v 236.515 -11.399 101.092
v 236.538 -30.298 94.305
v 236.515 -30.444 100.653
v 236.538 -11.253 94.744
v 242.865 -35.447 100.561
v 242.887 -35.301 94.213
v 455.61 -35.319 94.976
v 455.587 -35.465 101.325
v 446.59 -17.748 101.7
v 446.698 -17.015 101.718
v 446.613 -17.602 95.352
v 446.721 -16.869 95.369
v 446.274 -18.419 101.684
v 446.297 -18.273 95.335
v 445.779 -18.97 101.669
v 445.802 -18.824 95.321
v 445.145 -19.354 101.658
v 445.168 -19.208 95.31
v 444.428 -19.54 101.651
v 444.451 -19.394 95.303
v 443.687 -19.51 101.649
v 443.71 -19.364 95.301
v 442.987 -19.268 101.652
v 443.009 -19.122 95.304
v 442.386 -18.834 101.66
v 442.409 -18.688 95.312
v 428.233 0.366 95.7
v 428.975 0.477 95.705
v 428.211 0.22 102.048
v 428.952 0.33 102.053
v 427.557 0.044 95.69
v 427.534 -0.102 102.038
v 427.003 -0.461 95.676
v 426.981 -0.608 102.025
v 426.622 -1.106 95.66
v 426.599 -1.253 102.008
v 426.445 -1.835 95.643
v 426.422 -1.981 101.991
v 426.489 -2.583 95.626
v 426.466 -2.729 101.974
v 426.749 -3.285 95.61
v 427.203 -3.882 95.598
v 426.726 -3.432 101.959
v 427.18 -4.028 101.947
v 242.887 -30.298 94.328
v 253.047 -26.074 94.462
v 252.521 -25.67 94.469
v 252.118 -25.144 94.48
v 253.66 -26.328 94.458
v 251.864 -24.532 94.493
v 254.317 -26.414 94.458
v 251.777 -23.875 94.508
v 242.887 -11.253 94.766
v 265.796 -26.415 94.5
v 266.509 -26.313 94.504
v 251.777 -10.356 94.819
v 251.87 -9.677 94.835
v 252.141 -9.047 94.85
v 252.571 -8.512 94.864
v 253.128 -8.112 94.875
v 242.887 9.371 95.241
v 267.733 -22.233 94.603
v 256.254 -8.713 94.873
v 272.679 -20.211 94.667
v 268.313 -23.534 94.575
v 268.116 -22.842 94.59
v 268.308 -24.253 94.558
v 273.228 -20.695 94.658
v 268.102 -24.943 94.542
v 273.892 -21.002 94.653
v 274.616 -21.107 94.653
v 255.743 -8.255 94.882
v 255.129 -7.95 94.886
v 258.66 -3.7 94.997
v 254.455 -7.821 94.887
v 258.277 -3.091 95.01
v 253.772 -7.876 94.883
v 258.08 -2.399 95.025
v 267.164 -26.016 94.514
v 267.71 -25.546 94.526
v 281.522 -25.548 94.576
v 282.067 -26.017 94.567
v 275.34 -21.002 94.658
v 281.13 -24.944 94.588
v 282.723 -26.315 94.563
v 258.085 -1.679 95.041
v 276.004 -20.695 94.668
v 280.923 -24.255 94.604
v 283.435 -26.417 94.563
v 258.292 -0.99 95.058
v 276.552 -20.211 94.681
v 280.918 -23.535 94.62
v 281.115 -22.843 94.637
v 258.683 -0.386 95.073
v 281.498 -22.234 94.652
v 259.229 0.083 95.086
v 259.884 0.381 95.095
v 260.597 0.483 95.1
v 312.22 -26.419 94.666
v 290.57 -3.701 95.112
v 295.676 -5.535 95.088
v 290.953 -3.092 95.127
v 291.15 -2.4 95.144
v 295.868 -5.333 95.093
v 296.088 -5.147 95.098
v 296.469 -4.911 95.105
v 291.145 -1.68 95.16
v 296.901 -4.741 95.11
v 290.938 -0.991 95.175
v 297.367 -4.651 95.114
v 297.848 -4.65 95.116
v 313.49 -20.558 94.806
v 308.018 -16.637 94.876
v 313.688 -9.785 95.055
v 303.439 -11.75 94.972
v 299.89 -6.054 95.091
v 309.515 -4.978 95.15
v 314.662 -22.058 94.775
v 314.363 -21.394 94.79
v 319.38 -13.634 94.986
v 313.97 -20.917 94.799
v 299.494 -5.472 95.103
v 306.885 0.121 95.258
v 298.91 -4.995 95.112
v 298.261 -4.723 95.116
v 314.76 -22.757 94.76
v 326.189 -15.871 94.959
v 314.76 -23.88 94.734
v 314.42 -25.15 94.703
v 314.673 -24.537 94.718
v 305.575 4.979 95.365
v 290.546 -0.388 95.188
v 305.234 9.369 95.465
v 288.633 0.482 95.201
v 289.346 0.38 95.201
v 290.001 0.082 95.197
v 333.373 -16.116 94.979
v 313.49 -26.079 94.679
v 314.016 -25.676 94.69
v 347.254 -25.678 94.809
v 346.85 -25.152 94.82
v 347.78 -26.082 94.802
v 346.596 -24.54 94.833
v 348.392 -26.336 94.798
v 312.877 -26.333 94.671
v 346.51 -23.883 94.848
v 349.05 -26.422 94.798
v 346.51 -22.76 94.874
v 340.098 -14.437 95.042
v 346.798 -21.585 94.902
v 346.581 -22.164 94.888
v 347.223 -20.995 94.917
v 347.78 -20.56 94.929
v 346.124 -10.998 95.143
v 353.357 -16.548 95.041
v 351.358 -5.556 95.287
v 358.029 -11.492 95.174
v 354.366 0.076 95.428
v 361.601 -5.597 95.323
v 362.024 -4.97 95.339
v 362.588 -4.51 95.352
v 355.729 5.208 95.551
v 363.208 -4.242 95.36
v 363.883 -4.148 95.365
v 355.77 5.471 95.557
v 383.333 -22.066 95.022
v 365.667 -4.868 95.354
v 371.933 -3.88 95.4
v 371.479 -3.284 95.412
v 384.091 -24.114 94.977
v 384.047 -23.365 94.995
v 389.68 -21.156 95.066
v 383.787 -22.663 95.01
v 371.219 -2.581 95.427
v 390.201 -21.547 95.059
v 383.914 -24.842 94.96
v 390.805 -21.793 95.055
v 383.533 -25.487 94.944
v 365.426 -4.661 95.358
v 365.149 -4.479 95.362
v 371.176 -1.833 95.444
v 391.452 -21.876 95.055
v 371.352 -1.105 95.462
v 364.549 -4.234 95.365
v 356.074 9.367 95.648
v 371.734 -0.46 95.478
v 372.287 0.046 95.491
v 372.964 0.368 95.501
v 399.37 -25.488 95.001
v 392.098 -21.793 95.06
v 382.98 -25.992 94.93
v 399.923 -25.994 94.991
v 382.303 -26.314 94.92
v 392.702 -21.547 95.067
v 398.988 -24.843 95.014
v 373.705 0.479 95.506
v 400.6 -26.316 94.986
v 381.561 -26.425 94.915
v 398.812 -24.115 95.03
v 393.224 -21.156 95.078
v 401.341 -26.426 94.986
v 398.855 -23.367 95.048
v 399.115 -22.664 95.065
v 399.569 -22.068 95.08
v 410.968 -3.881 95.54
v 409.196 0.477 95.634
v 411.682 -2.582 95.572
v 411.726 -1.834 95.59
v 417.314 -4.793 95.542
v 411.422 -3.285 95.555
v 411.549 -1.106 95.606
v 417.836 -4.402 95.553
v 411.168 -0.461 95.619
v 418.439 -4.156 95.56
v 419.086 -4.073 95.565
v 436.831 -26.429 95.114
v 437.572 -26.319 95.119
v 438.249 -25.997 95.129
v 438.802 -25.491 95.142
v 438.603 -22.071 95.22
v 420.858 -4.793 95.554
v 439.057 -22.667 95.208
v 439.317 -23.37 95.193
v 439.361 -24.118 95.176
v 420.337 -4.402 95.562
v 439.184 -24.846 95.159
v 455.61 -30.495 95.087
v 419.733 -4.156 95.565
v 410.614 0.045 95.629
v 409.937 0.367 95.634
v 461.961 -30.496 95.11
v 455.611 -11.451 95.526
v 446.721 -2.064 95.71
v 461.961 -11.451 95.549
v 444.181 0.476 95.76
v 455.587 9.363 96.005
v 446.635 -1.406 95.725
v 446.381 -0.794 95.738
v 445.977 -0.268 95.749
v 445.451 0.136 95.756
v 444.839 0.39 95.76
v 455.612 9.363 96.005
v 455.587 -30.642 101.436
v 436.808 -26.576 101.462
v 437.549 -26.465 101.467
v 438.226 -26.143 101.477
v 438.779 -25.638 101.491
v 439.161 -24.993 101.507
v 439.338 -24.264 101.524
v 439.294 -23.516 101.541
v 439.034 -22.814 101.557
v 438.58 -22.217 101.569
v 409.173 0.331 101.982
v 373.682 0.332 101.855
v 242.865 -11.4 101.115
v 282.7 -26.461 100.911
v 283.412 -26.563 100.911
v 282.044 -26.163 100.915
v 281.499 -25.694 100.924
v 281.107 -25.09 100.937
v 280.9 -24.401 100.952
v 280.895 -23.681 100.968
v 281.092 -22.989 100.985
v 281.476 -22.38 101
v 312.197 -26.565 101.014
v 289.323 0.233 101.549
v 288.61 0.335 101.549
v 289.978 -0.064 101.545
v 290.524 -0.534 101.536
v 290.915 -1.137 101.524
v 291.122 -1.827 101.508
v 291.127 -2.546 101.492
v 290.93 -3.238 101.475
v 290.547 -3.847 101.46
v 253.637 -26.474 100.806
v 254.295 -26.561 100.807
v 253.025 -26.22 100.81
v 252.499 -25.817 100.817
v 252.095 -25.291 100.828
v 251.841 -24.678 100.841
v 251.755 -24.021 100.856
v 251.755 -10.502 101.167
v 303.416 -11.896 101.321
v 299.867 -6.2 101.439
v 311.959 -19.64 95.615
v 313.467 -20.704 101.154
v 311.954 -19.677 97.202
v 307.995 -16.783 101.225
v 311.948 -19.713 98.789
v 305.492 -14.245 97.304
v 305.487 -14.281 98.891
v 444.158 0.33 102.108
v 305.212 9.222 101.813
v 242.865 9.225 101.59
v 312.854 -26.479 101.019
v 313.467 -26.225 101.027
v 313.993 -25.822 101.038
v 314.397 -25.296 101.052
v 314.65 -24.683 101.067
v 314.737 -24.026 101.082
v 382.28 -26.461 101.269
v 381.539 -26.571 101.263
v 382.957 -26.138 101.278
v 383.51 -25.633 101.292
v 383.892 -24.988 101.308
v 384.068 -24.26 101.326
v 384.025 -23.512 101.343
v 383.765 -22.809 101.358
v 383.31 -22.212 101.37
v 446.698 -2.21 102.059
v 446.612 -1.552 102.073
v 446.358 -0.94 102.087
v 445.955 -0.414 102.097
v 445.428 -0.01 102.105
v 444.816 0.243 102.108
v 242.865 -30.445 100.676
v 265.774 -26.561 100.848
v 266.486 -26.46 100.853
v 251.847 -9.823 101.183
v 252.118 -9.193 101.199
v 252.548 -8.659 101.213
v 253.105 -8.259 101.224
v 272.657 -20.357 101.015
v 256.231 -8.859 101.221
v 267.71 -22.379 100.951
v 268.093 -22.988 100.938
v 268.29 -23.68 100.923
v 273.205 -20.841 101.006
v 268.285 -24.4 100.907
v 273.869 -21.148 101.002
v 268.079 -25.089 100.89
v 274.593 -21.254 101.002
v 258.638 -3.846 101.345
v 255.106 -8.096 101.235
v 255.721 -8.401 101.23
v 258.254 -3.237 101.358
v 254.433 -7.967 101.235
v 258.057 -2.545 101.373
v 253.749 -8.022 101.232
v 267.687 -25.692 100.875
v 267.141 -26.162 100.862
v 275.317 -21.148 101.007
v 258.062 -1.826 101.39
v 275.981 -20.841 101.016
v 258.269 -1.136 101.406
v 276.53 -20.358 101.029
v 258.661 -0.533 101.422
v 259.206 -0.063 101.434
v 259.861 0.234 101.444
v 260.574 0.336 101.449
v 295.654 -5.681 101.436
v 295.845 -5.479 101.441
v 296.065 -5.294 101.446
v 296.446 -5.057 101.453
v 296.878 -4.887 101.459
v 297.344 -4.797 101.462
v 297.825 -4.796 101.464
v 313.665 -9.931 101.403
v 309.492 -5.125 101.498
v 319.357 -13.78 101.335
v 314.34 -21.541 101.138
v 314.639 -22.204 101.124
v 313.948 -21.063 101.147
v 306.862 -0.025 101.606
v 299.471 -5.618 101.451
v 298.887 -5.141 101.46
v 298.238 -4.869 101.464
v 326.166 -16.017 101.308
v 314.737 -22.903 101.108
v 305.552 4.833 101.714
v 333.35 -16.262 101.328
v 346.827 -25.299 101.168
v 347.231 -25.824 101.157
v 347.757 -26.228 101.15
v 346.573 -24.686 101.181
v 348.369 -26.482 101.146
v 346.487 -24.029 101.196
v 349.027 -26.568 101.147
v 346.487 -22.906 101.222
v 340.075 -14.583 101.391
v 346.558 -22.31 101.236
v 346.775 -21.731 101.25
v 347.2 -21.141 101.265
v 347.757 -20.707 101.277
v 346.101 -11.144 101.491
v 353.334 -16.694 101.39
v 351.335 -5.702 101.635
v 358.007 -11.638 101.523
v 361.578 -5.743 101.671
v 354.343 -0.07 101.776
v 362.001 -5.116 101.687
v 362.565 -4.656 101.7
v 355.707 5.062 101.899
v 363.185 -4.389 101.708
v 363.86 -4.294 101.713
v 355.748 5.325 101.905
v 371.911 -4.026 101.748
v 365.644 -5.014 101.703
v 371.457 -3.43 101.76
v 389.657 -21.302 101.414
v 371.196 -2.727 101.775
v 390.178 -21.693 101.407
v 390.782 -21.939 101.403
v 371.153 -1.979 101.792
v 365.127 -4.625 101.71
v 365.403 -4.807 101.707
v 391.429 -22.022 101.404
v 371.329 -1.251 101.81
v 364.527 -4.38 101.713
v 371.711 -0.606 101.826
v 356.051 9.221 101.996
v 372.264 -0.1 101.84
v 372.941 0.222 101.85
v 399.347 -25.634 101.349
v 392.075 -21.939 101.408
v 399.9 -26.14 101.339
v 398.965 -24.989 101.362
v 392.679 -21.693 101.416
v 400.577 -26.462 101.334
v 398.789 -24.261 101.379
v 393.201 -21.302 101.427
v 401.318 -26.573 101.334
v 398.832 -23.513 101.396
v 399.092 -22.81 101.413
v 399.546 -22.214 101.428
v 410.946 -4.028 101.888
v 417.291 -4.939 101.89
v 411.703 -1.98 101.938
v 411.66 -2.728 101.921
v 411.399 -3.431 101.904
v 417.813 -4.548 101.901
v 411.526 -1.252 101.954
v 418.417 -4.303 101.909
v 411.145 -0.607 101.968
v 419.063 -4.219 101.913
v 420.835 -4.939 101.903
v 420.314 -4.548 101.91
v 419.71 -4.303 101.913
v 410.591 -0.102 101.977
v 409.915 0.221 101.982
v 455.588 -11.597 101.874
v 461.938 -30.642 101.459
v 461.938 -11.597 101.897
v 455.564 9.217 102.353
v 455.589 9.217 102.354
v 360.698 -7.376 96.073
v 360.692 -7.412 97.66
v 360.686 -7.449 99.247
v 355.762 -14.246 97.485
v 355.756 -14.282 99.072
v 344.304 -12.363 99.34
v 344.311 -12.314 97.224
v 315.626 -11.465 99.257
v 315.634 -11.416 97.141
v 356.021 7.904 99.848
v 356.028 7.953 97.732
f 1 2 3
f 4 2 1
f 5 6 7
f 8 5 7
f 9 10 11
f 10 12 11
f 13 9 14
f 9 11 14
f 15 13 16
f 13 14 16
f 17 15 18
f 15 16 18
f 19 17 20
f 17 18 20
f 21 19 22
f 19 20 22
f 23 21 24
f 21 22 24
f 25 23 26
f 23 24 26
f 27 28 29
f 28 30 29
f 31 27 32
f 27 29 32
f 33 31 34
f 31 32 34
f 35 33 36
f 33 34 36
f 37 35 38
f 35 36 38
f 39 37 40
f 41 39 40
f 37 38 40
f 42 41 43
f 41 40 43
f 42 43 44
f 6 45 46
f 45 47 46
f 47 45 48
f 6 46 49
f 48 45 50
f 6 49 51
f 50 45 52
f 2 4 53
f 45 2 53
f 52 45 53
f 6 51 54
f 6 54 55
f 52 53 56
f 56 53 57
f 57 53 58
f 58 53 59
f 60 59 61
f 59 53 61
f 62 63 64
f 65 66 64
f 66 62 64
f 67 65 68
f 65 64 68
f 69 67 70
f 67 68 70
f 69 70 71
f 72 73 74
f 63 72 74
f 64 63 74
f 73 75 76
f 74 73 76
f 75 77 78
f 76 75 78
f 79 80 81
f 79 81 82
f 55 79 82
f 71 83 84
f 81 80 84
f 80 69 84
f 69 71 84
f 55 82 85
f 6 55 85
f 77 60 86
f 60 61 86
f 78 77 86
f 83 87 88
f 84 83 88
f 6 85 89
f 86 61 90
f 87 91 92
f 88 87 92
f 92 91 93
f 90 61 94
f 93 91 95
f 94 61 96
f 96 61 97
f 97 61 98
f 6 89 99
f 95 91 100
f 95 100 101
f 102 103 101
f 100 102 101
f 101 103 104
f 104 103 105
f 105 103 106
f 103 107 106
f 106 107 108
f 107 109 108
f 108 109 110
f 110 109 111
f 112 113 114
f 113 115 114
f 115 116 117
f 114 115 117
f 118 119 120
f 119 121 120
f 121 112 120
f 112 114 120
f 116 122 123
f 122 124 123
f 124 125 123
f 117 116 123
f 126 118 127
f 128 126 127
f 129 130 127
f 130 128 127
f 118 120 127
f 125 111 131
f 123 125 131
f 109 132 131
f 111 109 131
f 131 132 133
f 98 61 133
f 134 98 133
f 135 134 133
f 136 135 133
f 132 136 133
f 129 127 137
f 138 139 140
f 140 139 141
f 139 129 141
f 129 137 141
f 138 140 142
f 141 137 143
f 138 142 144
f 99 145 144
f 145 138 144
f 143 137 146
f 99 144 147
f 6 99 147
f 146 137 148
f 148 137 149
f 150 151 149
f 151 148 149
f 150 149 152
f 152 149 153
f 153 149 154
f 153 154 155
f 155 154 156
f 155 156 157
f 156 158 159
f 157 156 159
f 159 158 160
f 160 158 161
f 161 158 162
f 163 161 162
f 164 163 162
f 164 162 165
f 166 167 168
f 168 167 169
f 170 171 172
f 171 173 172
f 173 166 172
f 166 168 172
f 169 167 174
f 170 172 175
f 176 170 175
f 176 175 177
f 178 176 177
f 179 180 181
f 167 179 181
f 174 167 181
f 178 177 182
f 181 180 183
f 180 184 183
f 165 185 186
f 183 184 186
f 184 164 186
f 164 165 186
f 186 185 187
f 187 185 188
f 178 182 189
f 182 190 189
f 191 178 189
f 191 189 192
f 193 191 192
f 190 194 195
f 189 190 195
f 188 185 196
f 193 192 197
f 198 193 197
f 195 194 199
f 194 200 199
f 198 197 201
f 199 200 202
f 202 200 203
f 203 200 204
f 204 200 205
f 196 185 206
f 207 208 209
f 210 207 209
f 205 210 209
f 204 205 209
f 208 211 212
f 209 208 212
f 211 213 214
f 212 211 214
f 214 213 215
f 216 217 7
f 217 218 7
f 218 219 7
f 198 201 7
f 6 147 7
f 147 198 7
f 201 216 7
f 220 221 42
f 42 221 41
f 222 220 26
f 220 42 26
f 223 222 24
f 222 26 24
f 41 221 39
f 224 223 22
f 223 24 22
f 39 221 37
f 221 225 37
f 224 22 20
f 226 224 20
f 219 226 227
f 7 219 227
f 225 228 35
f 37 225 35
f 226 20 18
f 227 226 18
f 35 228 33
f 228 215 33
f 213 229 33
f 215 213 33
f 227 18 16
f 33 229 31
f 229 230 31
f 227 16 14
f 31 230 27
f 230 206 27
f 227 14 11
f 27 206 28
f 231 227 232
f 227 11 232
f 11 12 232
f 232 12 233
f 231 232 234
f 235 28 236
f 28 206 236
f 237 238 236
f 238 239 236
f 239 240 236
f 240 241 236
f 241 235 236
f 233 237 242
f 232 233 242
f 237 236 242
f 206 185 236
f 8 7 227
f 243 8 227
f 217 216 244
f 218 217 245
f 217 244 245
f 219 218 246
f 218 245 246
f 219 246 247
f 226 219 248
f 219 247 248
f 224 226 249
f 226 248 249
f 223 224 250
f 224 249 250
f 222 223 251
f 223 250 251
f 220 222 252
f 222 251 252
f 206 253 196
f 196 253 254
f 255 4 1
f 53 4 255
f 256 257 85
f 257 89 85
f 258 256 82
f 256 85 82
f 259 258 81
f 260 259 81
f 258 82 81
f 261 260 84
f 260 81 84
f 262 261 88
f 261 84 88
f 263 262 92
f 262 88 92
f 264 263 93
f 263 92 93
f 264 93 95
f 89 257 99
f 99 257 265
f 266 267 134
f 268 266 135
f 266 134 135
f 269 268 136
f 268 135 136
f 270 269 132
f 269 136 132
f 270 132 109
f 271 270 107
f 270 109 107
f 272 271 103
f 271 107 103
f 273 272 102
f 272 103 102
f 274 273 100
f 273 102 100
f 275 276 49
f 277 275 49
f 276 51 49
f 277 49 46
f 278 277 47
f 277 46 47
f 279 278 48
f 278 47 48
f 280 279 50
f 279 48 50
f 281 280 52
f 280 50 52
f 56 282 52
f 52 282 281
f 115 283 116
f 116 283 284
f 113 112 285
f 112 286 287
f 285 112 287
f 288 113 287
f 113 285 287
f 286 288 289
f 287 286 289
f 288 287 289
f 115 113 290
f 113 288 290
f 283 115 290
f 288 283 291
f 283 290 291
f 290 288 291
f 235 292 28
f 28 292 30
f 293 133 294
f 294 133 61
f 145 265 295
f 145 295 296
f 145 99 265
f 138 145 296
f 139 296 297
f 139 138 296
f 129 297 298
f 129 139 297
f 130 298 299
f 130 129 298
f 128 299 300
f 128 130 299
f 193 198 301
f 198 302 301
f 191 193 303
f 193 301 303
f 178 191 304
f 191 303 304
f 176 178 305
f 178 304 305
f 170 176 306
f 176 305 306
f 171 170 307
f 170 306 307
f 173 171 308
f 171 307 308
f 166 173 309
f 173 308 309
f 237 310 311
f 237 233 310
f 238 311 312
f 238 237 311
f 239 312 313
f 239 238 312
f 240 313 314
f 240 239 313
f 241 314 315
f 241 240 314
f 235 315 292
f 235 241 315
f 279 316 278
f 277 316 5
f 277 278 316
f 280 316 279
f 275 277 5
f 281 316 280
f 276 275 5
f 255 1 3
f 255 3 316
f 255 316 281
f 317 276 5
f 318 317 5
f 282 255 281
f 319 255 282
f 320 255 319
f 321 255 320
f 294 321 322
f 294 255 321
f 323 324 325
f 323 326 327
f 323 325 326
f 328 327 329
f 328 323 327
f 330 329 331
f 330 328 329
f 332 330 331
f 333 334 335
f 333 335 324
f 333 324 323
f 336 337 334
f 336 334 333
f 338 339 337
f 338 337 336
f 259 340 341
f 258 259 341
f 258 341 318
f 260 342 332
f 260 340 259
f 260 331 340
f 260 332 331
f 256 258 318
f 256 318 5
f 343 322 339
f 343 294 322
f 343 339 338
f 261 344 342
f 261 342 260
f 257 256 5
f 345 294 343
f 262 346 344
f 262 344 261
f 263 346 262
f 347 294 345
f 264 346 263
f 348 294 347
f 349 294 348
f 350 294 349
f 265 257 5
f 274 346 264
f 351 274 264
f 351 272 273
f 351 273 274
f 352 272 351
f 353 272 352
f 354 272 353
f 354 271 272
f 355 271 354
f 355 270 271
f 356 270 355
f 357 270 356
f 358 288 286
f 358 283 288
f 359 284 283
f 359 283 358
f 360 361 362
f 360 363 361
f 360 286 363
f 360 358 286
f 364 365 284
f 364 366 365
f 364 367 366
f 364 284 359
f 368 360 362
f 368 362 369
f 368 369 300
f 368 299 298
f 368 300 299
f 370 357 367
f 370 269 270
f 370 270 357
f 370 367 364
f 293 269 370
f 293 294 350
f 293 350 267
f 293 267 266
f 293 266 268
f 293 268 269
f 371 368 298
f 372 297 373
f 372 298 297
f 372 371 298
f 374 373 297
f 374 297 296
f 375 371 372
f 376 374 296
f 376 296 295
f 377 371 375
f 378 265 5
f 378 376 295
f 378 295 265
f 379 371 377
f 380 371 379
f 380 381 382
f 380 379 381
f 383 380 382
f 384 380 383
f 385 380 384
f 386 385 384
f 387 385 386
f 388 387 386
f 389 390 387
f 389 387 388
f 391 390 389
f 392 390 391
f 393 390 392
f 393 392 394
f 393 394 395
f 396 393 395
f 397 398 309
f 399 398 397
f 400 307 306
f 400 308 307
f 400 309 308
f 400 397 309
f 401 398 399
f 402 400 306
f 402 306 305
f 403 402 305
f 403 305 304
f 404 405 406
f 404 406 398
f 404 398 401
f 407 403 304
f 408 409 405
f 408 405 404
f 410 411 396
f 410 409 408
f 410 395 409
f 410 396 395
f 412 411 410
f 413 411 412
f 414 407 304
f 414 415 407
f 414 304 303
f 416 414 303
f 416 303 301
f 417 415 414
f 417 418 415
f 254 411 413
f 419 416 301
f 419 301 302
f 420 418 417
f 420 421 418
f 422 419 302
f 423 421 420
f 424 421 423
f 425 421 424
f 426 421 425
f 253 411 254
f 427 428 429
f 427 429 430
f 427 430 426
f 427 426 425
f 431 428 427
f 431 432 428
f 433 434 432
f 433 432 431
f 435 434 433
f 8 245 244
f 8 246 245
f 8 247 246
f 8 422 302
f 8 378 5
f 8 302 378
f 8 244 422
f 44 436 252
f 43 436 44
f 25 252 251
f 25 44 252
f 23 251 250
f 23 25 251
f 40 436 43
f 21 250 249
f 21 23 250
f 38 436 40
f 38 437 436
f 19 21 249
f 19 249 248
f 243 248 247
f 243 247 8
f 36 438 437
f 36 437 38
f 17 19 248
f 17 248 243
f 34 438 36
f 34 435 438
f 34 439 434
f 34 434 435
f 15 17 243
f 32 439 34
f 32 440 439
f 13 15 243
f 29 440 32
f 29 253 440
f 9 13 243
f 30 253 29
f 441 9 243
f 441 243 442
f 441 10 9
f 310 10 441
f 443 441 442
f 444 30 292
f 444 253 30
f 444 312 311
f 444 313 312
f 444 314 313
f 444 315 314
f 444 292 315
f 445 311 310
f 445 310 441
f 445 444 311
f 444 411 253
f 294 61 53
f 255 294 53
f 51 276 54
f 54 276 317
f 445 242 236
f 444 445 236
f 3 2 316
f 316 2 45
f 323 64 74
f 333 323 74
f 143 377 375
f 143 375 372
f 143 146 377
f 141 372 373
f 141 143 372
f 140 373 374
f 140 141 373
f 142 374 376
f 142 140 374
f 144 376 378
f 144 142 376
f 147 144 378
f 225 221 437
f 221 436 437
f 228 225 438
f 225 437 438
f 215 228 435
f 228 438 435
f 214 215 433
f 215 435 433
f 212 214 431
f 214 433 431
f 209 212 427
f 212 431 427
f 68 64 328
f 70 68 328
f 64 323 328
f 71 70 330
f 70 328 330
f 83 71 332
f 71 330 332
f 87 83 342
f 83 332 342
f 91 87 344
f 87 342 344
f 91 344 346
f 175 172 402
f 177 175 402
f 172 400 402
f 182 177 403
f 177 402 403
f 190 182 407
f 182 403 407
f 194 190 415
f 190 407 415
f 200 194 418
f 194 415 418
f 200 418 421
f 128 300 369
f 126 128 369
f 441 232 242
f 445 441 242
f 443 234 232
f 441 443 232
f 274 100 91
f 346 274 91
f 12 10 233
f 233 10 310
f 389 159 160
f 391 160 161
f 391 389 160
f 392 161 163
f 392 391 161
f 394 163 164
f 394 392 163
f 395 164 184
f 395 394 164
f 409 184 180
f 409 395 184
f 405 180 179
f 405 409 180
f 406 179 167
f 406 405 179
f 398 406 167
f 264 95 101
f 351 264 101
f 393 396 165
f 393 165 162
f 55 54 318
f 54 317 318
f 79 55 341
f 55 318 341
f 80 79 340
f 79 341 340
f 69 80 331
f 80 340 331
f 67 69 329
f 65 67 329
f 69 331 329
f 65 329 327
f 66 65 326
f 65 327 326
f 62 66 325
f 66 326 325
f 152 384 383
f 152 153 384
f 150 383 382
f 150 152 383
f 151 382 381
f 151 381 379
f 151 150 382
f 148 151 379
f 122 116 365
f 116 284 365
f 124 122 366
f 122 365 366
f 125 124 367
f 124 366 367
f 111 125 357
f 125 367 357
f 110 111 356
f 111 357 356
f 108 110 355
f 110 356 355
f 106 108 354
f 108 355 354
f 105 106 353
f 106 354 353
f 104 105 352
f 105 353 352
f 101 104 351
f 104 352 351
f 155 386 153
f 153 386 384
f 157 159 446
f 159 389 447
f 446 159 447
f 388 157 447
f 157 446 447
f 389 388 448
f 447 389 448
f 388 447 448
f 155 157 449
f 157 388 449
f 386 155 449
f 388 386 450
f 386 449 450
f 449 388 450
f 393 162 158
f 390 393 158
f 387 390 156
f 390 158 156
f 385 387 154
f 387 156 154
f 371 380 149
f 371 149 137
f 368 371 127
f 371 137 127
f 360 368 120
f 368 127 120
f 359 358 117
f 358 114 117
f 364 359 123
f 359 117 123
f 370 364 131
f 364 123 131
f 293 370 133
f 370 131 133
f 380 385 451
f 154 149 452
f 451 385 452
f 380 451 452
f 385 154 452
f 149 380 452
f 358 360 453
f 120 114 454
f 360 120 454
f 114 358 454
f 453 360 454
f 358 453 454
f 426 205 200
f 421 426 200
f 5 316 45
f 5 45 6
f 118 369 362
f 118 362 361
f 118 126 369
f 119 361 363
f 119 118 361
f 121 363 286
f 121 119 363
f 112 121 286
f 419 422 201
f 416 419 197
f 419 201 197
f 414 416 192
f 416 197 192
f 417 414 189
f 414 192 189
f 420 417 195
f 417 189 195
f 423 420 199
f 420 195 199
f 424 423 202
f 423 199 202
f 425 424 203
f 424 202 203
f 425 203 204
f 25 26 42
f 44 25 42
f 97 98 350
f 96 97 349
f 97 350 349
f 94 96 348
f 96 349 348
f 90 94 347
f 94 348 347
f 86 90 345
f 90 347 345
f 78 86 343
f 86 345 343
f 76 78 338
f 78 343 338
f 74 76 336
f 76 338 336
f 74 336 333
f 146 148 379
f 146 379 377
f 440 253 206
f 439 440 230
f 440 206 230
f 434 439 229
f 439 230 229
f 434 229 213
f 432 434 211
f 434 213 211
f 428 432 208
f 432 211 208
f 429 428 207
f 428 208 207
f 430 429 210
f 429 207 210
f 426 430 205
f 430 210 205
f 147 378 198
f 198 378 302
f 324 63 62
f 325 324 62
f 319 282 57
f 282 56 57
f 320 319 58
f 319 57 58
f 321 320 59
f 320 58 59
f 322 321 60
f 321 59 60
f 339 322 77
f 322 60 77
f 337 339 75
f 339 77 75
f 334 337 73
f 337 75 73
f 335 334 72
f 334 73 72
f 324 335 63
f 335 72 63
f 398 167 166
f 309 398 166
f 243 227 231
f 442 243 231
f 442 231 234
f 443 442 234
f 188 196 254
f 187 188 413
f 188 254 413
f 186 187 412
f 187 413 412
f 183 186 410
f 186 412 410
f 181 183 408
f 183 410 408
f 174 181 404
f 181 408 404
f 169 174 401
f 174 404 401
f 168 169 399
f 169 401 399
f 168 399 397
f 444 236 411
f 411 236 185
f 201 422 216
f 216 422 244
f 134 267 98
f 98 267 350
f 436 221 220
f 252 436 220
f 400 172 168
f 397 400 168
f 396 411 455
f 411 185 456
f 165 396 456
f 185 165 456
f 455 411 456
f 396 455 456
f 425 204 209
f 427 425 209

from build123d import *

# Parameters (mm, degrees)
SKETCH1_W           = 6.35
SKETCH1_H           = 19.05
BOSS_EXTRUDE1_DEPTH = 6.35
CUT_EXTRUDE1_DEPTH  = 6.35
EXTRUDE_THIN3_START = -6.35
EXTRUDE_THIN3_DEPTH = 6.35
FILLET2_R           = 2.54


with BuildPart() as part:
    # Sketch1 → Boss-Extrude1 (new body)
    with BuildSketch(Plane(origin=(-0.338050957, -2.166981544, 94.101832391), x_dir=(0.999993551, -8.2681e-05, 0.003590468), z_dir=(-0.00359142, -0.023021797, 0.999728512))):
        with BuildLine():
            Line((243.227078617, -9.06878027), (243.227078617, -28.11878027))
            Line((243.227078617, -28.11878027), (243.227078617, -33.122710711))
            Line((243.227078617, -33.122710711), (455.95107602, -33.122710711))
            Line((455.95107602, -33.122710711), (455.95107602, -28.298303458))
            Line((455.95107602, -28.298303458), (455.951838068, -9.248303458))
            Line((455.951838068, -9.248303458), (455.952670896, 11.571066175))
            Line((455.952670896, 11.571066175), (455.928271144, 11.571065016))
            Line((455.928271144, 11.571065016), (356.413957438, 11.566336687))
            add(Edge.make_bspline(
                [(356.413957438, 11.566336687), (356.413154179, 10.230187882), (356.307050724, 8.928363908), (356.110746239, 7.669666942)],
                knots=[0.928343353, 0.928343353, 0.928343353, 0.928343353, 1, 1, 1, 1], degree=3, weights=[0.866956056, 0.907880921, 0.952228902, 1]))
            Line((356.110746239, 7.669666942), (356.069707191, 7.406526111))
            add(Edge.make_bspline(
                [(356.069707191, 7.406526111), (349.645197224, -33.787190013), (305.128556412, -35.346859606), (305.574396885, 11.563921094)],
                knots=[0, 0, 0, 0, 0.932216201, 0.932216201, 0.932216201, 0.932216201], degree=3, weights=[1, 0.378522533, 0.336396429, 0.873621689]))
            Line((305.574396885, 11.563921094), (243.227078617, 11.56095872))
            Line((243.227078617, 11.56095872), (243.227078617, -9.06878027))
        make_face()
        with Locations((240.052078617, -18.59378027)):
            Rectangle(SKETCH1_W, SKETCH1_H)
        Polygon((455.951838068, -9.248303458), (455.95107602, -28.298303458), (462.301838068, -28.298303458), (462.301838068, -9.248303458), align=None)
    extrude(amount=BOSS_EXTRUDE1_DEPTH)

    # Sketch4 → Cut-Extrude1 (cut)
    with BuildSketch(Plane(origin=(-0.360856472, -2.313169952, 100.450108445), x_dir=(0.999993551, -8.2681e-05, 0.003590468), z_dir=(-0.00359142, -0.023021797, 0.999728512))):
        with BuildLine():
            Line((447.06107602, -24.232710711), (447.061359456, -21.212677023))
            Line((447.061359456, -21.212677023), (447.062315249, 2.680643748))
            Line((447.062315249, 2.680643748), (364.155660196, 2.676704517))
            add(Edge.make_bspline(
                [(364.155660196, 2.676704517), (363.682655748, 0.861202633), (363.064243452, -0.90556276), (361.917066697, -3.482121278), (361.496667699, -4.330871885), (360.585218077, -5.993055638), (360.098114328, -6.79975573), (358.545391798, -9.148799286), (357.388958371, -10.620549815), (355.471920122, -12.686399888), (354.802074961, -13.351532301), (353.400459371, -14.63170826), (352.678029759, -15.238263747), (350.447885909, -16.96045064), (348.877725006, -17.979235773), (347.099980812, -18.935765266), (346.975195928, -19.001918677), (346.849935868, -19.067335155)],
                knots=[0, 0, 0, 0, 0.0625, 0.0625, 0.09375, 0.09375, 0.125, 0.125, 0.1875, 0.1875, 0.21875, 0.21875, 0.25, 0.25, 0.3125, 0.3125, 0.317199008, 0.317199008, 0.317199008, 0.317199008], degree=3))
            Line((346.849935868, -19.067335155), (346.849935868, -24.232710711))
            Line((346.849935868, -24.232710711), (447.06107602, -24.232710711))
        make_face()
        with BuildLine():
            Line((252.117078617, -24.232710711), (315.099935868, -24.232710711))
            Line((315.099935868, -24.232710711), (315.099935868, -19.067335155))
            add(Edge.make_bspline(
                [(315.099935868, -19.067335155), (314.975929033, -19.002569071), (314.852285143, -18.937030581), (313.903603629, -18.426757245), (313.094537504, -17.948032357), (311.509855263, -16.919395321), (310.733380771, -16.36830218), (308.497317264, -14.638176011), (307.115550753, -13.373897611), (305.203441753, -11.314112149), (304.592963657, -10.600151869), (303.426963523, -9.116307482), (302.869814737, -8.343419981), (301.312262481, -5.982806196), (300.415072454, -4.342556455), (298.894695177, -0.932977765), (298.271468298, 0.836332514), (297.792394207, 2.673551329)],
                knots=[0.682832517, 0.682832517, 0.682832517, 0.682832517, 0.6875, 0.6875, 0.71875, 0.71875, 0.75, 0.75, 0.8125, 0.8125, 0.84375, 0.84375, 0.875, 0.875, 0.9375, 0.9375, 1, 1, 1, 1], degree=3))
            Line((297.792394207, 2.673551329), (252.117078617, 2.67138111))
            Line((252.117078617, 2.67138111), (252.117078617, -24.232710711))
        make_face()
    extrude(amount=-CUT_EXTRUDE1_DEPTH, mode=Mode.SUBTRACT)

    # Sketch5 → Extrude-Thin3 (add)
    with BuildSketch(Plane(origin=(-0.360856472, -2.313169952, 100.450108445), x_dir=(0.999993551, -8.2681e-05, 0.003590468), z_dir=(-0.00359142, -0.023021797, 0.999728512)).offset(EXTRUDE_THIN3_START)):
        Polygon((250.180703918, 1.027588841), (274.956201281, -28.157757229), (299.728925104, 1.029943078), (295.85586331, 4.317159581), (274.955828291, -20.307664192), (254.053453316, 4.31517338), align=None)
        Polygon((362.38371865, 0.856862997), (391.792672106, -27.778018594), (419.426789837, -0.86614126), (445.288961546, -26.052383839), (448.833190494, -22.413037583), (419.426789837, 6.224802604), (391.792335202, -20.687402828), (365.927601742, 4.496546037), align=None)
    extrude(amount=EXTRUDE_THIN3_DEPTH)

    # Fillet2
    fillet2_edges = [part.edges().sort_by_distance(p)[0] for p in [
        (298.32854124, -2.470729974, 98.343628252),
        (255.097636261, 0.409634721, 98.254654941),
        (294.109382675, 0.408262278, 98.394768941),
        (251.765998957, -3.514034664, 98.152331935),
        (271.273016149, -26.488822109, 97.693344331),
        (274.60460134, -22.565091347, 97.795668563),
        (277.936290782, -26.489373041, 97.717268759),
        (362.969132405, -2.325780207, 98.579180702),
        (443.068140014, -26.503026473, 98.310173185),
        (395.081122323, -26.49905881, 98.137876228),
        (446.709043574, -22.959091678, 98.404862651),
        (367.44463473, 0.405682327, 98.658158726),
        (415.433854418, 0.403994055, 98.830516083),
        (391.440354753, -22.95438955, 98.206423967),
        (422.715052674, 0.4037379, 98.856667125),
        (419.074631168, -3.140666269, 98.761968583),
        (387.79956879, -26.498456757, 98.111731875),
        (314.748450021, -21.32841022, 97.968359479),
        (314.748450021, -26.492416744, 97.849442487),
        (251.765998957, -26.487209229, 97.623304561),
        (446.709978354, 0.402893753, 98.942846938),
        (346.49824526, -26.495041881, 97.963439843),
        (346.49824526, -21.331035356, 98.082356835),
    ]]
    fillet(fillet2_edges, radius=FILLET2_R)


solid = part.part
